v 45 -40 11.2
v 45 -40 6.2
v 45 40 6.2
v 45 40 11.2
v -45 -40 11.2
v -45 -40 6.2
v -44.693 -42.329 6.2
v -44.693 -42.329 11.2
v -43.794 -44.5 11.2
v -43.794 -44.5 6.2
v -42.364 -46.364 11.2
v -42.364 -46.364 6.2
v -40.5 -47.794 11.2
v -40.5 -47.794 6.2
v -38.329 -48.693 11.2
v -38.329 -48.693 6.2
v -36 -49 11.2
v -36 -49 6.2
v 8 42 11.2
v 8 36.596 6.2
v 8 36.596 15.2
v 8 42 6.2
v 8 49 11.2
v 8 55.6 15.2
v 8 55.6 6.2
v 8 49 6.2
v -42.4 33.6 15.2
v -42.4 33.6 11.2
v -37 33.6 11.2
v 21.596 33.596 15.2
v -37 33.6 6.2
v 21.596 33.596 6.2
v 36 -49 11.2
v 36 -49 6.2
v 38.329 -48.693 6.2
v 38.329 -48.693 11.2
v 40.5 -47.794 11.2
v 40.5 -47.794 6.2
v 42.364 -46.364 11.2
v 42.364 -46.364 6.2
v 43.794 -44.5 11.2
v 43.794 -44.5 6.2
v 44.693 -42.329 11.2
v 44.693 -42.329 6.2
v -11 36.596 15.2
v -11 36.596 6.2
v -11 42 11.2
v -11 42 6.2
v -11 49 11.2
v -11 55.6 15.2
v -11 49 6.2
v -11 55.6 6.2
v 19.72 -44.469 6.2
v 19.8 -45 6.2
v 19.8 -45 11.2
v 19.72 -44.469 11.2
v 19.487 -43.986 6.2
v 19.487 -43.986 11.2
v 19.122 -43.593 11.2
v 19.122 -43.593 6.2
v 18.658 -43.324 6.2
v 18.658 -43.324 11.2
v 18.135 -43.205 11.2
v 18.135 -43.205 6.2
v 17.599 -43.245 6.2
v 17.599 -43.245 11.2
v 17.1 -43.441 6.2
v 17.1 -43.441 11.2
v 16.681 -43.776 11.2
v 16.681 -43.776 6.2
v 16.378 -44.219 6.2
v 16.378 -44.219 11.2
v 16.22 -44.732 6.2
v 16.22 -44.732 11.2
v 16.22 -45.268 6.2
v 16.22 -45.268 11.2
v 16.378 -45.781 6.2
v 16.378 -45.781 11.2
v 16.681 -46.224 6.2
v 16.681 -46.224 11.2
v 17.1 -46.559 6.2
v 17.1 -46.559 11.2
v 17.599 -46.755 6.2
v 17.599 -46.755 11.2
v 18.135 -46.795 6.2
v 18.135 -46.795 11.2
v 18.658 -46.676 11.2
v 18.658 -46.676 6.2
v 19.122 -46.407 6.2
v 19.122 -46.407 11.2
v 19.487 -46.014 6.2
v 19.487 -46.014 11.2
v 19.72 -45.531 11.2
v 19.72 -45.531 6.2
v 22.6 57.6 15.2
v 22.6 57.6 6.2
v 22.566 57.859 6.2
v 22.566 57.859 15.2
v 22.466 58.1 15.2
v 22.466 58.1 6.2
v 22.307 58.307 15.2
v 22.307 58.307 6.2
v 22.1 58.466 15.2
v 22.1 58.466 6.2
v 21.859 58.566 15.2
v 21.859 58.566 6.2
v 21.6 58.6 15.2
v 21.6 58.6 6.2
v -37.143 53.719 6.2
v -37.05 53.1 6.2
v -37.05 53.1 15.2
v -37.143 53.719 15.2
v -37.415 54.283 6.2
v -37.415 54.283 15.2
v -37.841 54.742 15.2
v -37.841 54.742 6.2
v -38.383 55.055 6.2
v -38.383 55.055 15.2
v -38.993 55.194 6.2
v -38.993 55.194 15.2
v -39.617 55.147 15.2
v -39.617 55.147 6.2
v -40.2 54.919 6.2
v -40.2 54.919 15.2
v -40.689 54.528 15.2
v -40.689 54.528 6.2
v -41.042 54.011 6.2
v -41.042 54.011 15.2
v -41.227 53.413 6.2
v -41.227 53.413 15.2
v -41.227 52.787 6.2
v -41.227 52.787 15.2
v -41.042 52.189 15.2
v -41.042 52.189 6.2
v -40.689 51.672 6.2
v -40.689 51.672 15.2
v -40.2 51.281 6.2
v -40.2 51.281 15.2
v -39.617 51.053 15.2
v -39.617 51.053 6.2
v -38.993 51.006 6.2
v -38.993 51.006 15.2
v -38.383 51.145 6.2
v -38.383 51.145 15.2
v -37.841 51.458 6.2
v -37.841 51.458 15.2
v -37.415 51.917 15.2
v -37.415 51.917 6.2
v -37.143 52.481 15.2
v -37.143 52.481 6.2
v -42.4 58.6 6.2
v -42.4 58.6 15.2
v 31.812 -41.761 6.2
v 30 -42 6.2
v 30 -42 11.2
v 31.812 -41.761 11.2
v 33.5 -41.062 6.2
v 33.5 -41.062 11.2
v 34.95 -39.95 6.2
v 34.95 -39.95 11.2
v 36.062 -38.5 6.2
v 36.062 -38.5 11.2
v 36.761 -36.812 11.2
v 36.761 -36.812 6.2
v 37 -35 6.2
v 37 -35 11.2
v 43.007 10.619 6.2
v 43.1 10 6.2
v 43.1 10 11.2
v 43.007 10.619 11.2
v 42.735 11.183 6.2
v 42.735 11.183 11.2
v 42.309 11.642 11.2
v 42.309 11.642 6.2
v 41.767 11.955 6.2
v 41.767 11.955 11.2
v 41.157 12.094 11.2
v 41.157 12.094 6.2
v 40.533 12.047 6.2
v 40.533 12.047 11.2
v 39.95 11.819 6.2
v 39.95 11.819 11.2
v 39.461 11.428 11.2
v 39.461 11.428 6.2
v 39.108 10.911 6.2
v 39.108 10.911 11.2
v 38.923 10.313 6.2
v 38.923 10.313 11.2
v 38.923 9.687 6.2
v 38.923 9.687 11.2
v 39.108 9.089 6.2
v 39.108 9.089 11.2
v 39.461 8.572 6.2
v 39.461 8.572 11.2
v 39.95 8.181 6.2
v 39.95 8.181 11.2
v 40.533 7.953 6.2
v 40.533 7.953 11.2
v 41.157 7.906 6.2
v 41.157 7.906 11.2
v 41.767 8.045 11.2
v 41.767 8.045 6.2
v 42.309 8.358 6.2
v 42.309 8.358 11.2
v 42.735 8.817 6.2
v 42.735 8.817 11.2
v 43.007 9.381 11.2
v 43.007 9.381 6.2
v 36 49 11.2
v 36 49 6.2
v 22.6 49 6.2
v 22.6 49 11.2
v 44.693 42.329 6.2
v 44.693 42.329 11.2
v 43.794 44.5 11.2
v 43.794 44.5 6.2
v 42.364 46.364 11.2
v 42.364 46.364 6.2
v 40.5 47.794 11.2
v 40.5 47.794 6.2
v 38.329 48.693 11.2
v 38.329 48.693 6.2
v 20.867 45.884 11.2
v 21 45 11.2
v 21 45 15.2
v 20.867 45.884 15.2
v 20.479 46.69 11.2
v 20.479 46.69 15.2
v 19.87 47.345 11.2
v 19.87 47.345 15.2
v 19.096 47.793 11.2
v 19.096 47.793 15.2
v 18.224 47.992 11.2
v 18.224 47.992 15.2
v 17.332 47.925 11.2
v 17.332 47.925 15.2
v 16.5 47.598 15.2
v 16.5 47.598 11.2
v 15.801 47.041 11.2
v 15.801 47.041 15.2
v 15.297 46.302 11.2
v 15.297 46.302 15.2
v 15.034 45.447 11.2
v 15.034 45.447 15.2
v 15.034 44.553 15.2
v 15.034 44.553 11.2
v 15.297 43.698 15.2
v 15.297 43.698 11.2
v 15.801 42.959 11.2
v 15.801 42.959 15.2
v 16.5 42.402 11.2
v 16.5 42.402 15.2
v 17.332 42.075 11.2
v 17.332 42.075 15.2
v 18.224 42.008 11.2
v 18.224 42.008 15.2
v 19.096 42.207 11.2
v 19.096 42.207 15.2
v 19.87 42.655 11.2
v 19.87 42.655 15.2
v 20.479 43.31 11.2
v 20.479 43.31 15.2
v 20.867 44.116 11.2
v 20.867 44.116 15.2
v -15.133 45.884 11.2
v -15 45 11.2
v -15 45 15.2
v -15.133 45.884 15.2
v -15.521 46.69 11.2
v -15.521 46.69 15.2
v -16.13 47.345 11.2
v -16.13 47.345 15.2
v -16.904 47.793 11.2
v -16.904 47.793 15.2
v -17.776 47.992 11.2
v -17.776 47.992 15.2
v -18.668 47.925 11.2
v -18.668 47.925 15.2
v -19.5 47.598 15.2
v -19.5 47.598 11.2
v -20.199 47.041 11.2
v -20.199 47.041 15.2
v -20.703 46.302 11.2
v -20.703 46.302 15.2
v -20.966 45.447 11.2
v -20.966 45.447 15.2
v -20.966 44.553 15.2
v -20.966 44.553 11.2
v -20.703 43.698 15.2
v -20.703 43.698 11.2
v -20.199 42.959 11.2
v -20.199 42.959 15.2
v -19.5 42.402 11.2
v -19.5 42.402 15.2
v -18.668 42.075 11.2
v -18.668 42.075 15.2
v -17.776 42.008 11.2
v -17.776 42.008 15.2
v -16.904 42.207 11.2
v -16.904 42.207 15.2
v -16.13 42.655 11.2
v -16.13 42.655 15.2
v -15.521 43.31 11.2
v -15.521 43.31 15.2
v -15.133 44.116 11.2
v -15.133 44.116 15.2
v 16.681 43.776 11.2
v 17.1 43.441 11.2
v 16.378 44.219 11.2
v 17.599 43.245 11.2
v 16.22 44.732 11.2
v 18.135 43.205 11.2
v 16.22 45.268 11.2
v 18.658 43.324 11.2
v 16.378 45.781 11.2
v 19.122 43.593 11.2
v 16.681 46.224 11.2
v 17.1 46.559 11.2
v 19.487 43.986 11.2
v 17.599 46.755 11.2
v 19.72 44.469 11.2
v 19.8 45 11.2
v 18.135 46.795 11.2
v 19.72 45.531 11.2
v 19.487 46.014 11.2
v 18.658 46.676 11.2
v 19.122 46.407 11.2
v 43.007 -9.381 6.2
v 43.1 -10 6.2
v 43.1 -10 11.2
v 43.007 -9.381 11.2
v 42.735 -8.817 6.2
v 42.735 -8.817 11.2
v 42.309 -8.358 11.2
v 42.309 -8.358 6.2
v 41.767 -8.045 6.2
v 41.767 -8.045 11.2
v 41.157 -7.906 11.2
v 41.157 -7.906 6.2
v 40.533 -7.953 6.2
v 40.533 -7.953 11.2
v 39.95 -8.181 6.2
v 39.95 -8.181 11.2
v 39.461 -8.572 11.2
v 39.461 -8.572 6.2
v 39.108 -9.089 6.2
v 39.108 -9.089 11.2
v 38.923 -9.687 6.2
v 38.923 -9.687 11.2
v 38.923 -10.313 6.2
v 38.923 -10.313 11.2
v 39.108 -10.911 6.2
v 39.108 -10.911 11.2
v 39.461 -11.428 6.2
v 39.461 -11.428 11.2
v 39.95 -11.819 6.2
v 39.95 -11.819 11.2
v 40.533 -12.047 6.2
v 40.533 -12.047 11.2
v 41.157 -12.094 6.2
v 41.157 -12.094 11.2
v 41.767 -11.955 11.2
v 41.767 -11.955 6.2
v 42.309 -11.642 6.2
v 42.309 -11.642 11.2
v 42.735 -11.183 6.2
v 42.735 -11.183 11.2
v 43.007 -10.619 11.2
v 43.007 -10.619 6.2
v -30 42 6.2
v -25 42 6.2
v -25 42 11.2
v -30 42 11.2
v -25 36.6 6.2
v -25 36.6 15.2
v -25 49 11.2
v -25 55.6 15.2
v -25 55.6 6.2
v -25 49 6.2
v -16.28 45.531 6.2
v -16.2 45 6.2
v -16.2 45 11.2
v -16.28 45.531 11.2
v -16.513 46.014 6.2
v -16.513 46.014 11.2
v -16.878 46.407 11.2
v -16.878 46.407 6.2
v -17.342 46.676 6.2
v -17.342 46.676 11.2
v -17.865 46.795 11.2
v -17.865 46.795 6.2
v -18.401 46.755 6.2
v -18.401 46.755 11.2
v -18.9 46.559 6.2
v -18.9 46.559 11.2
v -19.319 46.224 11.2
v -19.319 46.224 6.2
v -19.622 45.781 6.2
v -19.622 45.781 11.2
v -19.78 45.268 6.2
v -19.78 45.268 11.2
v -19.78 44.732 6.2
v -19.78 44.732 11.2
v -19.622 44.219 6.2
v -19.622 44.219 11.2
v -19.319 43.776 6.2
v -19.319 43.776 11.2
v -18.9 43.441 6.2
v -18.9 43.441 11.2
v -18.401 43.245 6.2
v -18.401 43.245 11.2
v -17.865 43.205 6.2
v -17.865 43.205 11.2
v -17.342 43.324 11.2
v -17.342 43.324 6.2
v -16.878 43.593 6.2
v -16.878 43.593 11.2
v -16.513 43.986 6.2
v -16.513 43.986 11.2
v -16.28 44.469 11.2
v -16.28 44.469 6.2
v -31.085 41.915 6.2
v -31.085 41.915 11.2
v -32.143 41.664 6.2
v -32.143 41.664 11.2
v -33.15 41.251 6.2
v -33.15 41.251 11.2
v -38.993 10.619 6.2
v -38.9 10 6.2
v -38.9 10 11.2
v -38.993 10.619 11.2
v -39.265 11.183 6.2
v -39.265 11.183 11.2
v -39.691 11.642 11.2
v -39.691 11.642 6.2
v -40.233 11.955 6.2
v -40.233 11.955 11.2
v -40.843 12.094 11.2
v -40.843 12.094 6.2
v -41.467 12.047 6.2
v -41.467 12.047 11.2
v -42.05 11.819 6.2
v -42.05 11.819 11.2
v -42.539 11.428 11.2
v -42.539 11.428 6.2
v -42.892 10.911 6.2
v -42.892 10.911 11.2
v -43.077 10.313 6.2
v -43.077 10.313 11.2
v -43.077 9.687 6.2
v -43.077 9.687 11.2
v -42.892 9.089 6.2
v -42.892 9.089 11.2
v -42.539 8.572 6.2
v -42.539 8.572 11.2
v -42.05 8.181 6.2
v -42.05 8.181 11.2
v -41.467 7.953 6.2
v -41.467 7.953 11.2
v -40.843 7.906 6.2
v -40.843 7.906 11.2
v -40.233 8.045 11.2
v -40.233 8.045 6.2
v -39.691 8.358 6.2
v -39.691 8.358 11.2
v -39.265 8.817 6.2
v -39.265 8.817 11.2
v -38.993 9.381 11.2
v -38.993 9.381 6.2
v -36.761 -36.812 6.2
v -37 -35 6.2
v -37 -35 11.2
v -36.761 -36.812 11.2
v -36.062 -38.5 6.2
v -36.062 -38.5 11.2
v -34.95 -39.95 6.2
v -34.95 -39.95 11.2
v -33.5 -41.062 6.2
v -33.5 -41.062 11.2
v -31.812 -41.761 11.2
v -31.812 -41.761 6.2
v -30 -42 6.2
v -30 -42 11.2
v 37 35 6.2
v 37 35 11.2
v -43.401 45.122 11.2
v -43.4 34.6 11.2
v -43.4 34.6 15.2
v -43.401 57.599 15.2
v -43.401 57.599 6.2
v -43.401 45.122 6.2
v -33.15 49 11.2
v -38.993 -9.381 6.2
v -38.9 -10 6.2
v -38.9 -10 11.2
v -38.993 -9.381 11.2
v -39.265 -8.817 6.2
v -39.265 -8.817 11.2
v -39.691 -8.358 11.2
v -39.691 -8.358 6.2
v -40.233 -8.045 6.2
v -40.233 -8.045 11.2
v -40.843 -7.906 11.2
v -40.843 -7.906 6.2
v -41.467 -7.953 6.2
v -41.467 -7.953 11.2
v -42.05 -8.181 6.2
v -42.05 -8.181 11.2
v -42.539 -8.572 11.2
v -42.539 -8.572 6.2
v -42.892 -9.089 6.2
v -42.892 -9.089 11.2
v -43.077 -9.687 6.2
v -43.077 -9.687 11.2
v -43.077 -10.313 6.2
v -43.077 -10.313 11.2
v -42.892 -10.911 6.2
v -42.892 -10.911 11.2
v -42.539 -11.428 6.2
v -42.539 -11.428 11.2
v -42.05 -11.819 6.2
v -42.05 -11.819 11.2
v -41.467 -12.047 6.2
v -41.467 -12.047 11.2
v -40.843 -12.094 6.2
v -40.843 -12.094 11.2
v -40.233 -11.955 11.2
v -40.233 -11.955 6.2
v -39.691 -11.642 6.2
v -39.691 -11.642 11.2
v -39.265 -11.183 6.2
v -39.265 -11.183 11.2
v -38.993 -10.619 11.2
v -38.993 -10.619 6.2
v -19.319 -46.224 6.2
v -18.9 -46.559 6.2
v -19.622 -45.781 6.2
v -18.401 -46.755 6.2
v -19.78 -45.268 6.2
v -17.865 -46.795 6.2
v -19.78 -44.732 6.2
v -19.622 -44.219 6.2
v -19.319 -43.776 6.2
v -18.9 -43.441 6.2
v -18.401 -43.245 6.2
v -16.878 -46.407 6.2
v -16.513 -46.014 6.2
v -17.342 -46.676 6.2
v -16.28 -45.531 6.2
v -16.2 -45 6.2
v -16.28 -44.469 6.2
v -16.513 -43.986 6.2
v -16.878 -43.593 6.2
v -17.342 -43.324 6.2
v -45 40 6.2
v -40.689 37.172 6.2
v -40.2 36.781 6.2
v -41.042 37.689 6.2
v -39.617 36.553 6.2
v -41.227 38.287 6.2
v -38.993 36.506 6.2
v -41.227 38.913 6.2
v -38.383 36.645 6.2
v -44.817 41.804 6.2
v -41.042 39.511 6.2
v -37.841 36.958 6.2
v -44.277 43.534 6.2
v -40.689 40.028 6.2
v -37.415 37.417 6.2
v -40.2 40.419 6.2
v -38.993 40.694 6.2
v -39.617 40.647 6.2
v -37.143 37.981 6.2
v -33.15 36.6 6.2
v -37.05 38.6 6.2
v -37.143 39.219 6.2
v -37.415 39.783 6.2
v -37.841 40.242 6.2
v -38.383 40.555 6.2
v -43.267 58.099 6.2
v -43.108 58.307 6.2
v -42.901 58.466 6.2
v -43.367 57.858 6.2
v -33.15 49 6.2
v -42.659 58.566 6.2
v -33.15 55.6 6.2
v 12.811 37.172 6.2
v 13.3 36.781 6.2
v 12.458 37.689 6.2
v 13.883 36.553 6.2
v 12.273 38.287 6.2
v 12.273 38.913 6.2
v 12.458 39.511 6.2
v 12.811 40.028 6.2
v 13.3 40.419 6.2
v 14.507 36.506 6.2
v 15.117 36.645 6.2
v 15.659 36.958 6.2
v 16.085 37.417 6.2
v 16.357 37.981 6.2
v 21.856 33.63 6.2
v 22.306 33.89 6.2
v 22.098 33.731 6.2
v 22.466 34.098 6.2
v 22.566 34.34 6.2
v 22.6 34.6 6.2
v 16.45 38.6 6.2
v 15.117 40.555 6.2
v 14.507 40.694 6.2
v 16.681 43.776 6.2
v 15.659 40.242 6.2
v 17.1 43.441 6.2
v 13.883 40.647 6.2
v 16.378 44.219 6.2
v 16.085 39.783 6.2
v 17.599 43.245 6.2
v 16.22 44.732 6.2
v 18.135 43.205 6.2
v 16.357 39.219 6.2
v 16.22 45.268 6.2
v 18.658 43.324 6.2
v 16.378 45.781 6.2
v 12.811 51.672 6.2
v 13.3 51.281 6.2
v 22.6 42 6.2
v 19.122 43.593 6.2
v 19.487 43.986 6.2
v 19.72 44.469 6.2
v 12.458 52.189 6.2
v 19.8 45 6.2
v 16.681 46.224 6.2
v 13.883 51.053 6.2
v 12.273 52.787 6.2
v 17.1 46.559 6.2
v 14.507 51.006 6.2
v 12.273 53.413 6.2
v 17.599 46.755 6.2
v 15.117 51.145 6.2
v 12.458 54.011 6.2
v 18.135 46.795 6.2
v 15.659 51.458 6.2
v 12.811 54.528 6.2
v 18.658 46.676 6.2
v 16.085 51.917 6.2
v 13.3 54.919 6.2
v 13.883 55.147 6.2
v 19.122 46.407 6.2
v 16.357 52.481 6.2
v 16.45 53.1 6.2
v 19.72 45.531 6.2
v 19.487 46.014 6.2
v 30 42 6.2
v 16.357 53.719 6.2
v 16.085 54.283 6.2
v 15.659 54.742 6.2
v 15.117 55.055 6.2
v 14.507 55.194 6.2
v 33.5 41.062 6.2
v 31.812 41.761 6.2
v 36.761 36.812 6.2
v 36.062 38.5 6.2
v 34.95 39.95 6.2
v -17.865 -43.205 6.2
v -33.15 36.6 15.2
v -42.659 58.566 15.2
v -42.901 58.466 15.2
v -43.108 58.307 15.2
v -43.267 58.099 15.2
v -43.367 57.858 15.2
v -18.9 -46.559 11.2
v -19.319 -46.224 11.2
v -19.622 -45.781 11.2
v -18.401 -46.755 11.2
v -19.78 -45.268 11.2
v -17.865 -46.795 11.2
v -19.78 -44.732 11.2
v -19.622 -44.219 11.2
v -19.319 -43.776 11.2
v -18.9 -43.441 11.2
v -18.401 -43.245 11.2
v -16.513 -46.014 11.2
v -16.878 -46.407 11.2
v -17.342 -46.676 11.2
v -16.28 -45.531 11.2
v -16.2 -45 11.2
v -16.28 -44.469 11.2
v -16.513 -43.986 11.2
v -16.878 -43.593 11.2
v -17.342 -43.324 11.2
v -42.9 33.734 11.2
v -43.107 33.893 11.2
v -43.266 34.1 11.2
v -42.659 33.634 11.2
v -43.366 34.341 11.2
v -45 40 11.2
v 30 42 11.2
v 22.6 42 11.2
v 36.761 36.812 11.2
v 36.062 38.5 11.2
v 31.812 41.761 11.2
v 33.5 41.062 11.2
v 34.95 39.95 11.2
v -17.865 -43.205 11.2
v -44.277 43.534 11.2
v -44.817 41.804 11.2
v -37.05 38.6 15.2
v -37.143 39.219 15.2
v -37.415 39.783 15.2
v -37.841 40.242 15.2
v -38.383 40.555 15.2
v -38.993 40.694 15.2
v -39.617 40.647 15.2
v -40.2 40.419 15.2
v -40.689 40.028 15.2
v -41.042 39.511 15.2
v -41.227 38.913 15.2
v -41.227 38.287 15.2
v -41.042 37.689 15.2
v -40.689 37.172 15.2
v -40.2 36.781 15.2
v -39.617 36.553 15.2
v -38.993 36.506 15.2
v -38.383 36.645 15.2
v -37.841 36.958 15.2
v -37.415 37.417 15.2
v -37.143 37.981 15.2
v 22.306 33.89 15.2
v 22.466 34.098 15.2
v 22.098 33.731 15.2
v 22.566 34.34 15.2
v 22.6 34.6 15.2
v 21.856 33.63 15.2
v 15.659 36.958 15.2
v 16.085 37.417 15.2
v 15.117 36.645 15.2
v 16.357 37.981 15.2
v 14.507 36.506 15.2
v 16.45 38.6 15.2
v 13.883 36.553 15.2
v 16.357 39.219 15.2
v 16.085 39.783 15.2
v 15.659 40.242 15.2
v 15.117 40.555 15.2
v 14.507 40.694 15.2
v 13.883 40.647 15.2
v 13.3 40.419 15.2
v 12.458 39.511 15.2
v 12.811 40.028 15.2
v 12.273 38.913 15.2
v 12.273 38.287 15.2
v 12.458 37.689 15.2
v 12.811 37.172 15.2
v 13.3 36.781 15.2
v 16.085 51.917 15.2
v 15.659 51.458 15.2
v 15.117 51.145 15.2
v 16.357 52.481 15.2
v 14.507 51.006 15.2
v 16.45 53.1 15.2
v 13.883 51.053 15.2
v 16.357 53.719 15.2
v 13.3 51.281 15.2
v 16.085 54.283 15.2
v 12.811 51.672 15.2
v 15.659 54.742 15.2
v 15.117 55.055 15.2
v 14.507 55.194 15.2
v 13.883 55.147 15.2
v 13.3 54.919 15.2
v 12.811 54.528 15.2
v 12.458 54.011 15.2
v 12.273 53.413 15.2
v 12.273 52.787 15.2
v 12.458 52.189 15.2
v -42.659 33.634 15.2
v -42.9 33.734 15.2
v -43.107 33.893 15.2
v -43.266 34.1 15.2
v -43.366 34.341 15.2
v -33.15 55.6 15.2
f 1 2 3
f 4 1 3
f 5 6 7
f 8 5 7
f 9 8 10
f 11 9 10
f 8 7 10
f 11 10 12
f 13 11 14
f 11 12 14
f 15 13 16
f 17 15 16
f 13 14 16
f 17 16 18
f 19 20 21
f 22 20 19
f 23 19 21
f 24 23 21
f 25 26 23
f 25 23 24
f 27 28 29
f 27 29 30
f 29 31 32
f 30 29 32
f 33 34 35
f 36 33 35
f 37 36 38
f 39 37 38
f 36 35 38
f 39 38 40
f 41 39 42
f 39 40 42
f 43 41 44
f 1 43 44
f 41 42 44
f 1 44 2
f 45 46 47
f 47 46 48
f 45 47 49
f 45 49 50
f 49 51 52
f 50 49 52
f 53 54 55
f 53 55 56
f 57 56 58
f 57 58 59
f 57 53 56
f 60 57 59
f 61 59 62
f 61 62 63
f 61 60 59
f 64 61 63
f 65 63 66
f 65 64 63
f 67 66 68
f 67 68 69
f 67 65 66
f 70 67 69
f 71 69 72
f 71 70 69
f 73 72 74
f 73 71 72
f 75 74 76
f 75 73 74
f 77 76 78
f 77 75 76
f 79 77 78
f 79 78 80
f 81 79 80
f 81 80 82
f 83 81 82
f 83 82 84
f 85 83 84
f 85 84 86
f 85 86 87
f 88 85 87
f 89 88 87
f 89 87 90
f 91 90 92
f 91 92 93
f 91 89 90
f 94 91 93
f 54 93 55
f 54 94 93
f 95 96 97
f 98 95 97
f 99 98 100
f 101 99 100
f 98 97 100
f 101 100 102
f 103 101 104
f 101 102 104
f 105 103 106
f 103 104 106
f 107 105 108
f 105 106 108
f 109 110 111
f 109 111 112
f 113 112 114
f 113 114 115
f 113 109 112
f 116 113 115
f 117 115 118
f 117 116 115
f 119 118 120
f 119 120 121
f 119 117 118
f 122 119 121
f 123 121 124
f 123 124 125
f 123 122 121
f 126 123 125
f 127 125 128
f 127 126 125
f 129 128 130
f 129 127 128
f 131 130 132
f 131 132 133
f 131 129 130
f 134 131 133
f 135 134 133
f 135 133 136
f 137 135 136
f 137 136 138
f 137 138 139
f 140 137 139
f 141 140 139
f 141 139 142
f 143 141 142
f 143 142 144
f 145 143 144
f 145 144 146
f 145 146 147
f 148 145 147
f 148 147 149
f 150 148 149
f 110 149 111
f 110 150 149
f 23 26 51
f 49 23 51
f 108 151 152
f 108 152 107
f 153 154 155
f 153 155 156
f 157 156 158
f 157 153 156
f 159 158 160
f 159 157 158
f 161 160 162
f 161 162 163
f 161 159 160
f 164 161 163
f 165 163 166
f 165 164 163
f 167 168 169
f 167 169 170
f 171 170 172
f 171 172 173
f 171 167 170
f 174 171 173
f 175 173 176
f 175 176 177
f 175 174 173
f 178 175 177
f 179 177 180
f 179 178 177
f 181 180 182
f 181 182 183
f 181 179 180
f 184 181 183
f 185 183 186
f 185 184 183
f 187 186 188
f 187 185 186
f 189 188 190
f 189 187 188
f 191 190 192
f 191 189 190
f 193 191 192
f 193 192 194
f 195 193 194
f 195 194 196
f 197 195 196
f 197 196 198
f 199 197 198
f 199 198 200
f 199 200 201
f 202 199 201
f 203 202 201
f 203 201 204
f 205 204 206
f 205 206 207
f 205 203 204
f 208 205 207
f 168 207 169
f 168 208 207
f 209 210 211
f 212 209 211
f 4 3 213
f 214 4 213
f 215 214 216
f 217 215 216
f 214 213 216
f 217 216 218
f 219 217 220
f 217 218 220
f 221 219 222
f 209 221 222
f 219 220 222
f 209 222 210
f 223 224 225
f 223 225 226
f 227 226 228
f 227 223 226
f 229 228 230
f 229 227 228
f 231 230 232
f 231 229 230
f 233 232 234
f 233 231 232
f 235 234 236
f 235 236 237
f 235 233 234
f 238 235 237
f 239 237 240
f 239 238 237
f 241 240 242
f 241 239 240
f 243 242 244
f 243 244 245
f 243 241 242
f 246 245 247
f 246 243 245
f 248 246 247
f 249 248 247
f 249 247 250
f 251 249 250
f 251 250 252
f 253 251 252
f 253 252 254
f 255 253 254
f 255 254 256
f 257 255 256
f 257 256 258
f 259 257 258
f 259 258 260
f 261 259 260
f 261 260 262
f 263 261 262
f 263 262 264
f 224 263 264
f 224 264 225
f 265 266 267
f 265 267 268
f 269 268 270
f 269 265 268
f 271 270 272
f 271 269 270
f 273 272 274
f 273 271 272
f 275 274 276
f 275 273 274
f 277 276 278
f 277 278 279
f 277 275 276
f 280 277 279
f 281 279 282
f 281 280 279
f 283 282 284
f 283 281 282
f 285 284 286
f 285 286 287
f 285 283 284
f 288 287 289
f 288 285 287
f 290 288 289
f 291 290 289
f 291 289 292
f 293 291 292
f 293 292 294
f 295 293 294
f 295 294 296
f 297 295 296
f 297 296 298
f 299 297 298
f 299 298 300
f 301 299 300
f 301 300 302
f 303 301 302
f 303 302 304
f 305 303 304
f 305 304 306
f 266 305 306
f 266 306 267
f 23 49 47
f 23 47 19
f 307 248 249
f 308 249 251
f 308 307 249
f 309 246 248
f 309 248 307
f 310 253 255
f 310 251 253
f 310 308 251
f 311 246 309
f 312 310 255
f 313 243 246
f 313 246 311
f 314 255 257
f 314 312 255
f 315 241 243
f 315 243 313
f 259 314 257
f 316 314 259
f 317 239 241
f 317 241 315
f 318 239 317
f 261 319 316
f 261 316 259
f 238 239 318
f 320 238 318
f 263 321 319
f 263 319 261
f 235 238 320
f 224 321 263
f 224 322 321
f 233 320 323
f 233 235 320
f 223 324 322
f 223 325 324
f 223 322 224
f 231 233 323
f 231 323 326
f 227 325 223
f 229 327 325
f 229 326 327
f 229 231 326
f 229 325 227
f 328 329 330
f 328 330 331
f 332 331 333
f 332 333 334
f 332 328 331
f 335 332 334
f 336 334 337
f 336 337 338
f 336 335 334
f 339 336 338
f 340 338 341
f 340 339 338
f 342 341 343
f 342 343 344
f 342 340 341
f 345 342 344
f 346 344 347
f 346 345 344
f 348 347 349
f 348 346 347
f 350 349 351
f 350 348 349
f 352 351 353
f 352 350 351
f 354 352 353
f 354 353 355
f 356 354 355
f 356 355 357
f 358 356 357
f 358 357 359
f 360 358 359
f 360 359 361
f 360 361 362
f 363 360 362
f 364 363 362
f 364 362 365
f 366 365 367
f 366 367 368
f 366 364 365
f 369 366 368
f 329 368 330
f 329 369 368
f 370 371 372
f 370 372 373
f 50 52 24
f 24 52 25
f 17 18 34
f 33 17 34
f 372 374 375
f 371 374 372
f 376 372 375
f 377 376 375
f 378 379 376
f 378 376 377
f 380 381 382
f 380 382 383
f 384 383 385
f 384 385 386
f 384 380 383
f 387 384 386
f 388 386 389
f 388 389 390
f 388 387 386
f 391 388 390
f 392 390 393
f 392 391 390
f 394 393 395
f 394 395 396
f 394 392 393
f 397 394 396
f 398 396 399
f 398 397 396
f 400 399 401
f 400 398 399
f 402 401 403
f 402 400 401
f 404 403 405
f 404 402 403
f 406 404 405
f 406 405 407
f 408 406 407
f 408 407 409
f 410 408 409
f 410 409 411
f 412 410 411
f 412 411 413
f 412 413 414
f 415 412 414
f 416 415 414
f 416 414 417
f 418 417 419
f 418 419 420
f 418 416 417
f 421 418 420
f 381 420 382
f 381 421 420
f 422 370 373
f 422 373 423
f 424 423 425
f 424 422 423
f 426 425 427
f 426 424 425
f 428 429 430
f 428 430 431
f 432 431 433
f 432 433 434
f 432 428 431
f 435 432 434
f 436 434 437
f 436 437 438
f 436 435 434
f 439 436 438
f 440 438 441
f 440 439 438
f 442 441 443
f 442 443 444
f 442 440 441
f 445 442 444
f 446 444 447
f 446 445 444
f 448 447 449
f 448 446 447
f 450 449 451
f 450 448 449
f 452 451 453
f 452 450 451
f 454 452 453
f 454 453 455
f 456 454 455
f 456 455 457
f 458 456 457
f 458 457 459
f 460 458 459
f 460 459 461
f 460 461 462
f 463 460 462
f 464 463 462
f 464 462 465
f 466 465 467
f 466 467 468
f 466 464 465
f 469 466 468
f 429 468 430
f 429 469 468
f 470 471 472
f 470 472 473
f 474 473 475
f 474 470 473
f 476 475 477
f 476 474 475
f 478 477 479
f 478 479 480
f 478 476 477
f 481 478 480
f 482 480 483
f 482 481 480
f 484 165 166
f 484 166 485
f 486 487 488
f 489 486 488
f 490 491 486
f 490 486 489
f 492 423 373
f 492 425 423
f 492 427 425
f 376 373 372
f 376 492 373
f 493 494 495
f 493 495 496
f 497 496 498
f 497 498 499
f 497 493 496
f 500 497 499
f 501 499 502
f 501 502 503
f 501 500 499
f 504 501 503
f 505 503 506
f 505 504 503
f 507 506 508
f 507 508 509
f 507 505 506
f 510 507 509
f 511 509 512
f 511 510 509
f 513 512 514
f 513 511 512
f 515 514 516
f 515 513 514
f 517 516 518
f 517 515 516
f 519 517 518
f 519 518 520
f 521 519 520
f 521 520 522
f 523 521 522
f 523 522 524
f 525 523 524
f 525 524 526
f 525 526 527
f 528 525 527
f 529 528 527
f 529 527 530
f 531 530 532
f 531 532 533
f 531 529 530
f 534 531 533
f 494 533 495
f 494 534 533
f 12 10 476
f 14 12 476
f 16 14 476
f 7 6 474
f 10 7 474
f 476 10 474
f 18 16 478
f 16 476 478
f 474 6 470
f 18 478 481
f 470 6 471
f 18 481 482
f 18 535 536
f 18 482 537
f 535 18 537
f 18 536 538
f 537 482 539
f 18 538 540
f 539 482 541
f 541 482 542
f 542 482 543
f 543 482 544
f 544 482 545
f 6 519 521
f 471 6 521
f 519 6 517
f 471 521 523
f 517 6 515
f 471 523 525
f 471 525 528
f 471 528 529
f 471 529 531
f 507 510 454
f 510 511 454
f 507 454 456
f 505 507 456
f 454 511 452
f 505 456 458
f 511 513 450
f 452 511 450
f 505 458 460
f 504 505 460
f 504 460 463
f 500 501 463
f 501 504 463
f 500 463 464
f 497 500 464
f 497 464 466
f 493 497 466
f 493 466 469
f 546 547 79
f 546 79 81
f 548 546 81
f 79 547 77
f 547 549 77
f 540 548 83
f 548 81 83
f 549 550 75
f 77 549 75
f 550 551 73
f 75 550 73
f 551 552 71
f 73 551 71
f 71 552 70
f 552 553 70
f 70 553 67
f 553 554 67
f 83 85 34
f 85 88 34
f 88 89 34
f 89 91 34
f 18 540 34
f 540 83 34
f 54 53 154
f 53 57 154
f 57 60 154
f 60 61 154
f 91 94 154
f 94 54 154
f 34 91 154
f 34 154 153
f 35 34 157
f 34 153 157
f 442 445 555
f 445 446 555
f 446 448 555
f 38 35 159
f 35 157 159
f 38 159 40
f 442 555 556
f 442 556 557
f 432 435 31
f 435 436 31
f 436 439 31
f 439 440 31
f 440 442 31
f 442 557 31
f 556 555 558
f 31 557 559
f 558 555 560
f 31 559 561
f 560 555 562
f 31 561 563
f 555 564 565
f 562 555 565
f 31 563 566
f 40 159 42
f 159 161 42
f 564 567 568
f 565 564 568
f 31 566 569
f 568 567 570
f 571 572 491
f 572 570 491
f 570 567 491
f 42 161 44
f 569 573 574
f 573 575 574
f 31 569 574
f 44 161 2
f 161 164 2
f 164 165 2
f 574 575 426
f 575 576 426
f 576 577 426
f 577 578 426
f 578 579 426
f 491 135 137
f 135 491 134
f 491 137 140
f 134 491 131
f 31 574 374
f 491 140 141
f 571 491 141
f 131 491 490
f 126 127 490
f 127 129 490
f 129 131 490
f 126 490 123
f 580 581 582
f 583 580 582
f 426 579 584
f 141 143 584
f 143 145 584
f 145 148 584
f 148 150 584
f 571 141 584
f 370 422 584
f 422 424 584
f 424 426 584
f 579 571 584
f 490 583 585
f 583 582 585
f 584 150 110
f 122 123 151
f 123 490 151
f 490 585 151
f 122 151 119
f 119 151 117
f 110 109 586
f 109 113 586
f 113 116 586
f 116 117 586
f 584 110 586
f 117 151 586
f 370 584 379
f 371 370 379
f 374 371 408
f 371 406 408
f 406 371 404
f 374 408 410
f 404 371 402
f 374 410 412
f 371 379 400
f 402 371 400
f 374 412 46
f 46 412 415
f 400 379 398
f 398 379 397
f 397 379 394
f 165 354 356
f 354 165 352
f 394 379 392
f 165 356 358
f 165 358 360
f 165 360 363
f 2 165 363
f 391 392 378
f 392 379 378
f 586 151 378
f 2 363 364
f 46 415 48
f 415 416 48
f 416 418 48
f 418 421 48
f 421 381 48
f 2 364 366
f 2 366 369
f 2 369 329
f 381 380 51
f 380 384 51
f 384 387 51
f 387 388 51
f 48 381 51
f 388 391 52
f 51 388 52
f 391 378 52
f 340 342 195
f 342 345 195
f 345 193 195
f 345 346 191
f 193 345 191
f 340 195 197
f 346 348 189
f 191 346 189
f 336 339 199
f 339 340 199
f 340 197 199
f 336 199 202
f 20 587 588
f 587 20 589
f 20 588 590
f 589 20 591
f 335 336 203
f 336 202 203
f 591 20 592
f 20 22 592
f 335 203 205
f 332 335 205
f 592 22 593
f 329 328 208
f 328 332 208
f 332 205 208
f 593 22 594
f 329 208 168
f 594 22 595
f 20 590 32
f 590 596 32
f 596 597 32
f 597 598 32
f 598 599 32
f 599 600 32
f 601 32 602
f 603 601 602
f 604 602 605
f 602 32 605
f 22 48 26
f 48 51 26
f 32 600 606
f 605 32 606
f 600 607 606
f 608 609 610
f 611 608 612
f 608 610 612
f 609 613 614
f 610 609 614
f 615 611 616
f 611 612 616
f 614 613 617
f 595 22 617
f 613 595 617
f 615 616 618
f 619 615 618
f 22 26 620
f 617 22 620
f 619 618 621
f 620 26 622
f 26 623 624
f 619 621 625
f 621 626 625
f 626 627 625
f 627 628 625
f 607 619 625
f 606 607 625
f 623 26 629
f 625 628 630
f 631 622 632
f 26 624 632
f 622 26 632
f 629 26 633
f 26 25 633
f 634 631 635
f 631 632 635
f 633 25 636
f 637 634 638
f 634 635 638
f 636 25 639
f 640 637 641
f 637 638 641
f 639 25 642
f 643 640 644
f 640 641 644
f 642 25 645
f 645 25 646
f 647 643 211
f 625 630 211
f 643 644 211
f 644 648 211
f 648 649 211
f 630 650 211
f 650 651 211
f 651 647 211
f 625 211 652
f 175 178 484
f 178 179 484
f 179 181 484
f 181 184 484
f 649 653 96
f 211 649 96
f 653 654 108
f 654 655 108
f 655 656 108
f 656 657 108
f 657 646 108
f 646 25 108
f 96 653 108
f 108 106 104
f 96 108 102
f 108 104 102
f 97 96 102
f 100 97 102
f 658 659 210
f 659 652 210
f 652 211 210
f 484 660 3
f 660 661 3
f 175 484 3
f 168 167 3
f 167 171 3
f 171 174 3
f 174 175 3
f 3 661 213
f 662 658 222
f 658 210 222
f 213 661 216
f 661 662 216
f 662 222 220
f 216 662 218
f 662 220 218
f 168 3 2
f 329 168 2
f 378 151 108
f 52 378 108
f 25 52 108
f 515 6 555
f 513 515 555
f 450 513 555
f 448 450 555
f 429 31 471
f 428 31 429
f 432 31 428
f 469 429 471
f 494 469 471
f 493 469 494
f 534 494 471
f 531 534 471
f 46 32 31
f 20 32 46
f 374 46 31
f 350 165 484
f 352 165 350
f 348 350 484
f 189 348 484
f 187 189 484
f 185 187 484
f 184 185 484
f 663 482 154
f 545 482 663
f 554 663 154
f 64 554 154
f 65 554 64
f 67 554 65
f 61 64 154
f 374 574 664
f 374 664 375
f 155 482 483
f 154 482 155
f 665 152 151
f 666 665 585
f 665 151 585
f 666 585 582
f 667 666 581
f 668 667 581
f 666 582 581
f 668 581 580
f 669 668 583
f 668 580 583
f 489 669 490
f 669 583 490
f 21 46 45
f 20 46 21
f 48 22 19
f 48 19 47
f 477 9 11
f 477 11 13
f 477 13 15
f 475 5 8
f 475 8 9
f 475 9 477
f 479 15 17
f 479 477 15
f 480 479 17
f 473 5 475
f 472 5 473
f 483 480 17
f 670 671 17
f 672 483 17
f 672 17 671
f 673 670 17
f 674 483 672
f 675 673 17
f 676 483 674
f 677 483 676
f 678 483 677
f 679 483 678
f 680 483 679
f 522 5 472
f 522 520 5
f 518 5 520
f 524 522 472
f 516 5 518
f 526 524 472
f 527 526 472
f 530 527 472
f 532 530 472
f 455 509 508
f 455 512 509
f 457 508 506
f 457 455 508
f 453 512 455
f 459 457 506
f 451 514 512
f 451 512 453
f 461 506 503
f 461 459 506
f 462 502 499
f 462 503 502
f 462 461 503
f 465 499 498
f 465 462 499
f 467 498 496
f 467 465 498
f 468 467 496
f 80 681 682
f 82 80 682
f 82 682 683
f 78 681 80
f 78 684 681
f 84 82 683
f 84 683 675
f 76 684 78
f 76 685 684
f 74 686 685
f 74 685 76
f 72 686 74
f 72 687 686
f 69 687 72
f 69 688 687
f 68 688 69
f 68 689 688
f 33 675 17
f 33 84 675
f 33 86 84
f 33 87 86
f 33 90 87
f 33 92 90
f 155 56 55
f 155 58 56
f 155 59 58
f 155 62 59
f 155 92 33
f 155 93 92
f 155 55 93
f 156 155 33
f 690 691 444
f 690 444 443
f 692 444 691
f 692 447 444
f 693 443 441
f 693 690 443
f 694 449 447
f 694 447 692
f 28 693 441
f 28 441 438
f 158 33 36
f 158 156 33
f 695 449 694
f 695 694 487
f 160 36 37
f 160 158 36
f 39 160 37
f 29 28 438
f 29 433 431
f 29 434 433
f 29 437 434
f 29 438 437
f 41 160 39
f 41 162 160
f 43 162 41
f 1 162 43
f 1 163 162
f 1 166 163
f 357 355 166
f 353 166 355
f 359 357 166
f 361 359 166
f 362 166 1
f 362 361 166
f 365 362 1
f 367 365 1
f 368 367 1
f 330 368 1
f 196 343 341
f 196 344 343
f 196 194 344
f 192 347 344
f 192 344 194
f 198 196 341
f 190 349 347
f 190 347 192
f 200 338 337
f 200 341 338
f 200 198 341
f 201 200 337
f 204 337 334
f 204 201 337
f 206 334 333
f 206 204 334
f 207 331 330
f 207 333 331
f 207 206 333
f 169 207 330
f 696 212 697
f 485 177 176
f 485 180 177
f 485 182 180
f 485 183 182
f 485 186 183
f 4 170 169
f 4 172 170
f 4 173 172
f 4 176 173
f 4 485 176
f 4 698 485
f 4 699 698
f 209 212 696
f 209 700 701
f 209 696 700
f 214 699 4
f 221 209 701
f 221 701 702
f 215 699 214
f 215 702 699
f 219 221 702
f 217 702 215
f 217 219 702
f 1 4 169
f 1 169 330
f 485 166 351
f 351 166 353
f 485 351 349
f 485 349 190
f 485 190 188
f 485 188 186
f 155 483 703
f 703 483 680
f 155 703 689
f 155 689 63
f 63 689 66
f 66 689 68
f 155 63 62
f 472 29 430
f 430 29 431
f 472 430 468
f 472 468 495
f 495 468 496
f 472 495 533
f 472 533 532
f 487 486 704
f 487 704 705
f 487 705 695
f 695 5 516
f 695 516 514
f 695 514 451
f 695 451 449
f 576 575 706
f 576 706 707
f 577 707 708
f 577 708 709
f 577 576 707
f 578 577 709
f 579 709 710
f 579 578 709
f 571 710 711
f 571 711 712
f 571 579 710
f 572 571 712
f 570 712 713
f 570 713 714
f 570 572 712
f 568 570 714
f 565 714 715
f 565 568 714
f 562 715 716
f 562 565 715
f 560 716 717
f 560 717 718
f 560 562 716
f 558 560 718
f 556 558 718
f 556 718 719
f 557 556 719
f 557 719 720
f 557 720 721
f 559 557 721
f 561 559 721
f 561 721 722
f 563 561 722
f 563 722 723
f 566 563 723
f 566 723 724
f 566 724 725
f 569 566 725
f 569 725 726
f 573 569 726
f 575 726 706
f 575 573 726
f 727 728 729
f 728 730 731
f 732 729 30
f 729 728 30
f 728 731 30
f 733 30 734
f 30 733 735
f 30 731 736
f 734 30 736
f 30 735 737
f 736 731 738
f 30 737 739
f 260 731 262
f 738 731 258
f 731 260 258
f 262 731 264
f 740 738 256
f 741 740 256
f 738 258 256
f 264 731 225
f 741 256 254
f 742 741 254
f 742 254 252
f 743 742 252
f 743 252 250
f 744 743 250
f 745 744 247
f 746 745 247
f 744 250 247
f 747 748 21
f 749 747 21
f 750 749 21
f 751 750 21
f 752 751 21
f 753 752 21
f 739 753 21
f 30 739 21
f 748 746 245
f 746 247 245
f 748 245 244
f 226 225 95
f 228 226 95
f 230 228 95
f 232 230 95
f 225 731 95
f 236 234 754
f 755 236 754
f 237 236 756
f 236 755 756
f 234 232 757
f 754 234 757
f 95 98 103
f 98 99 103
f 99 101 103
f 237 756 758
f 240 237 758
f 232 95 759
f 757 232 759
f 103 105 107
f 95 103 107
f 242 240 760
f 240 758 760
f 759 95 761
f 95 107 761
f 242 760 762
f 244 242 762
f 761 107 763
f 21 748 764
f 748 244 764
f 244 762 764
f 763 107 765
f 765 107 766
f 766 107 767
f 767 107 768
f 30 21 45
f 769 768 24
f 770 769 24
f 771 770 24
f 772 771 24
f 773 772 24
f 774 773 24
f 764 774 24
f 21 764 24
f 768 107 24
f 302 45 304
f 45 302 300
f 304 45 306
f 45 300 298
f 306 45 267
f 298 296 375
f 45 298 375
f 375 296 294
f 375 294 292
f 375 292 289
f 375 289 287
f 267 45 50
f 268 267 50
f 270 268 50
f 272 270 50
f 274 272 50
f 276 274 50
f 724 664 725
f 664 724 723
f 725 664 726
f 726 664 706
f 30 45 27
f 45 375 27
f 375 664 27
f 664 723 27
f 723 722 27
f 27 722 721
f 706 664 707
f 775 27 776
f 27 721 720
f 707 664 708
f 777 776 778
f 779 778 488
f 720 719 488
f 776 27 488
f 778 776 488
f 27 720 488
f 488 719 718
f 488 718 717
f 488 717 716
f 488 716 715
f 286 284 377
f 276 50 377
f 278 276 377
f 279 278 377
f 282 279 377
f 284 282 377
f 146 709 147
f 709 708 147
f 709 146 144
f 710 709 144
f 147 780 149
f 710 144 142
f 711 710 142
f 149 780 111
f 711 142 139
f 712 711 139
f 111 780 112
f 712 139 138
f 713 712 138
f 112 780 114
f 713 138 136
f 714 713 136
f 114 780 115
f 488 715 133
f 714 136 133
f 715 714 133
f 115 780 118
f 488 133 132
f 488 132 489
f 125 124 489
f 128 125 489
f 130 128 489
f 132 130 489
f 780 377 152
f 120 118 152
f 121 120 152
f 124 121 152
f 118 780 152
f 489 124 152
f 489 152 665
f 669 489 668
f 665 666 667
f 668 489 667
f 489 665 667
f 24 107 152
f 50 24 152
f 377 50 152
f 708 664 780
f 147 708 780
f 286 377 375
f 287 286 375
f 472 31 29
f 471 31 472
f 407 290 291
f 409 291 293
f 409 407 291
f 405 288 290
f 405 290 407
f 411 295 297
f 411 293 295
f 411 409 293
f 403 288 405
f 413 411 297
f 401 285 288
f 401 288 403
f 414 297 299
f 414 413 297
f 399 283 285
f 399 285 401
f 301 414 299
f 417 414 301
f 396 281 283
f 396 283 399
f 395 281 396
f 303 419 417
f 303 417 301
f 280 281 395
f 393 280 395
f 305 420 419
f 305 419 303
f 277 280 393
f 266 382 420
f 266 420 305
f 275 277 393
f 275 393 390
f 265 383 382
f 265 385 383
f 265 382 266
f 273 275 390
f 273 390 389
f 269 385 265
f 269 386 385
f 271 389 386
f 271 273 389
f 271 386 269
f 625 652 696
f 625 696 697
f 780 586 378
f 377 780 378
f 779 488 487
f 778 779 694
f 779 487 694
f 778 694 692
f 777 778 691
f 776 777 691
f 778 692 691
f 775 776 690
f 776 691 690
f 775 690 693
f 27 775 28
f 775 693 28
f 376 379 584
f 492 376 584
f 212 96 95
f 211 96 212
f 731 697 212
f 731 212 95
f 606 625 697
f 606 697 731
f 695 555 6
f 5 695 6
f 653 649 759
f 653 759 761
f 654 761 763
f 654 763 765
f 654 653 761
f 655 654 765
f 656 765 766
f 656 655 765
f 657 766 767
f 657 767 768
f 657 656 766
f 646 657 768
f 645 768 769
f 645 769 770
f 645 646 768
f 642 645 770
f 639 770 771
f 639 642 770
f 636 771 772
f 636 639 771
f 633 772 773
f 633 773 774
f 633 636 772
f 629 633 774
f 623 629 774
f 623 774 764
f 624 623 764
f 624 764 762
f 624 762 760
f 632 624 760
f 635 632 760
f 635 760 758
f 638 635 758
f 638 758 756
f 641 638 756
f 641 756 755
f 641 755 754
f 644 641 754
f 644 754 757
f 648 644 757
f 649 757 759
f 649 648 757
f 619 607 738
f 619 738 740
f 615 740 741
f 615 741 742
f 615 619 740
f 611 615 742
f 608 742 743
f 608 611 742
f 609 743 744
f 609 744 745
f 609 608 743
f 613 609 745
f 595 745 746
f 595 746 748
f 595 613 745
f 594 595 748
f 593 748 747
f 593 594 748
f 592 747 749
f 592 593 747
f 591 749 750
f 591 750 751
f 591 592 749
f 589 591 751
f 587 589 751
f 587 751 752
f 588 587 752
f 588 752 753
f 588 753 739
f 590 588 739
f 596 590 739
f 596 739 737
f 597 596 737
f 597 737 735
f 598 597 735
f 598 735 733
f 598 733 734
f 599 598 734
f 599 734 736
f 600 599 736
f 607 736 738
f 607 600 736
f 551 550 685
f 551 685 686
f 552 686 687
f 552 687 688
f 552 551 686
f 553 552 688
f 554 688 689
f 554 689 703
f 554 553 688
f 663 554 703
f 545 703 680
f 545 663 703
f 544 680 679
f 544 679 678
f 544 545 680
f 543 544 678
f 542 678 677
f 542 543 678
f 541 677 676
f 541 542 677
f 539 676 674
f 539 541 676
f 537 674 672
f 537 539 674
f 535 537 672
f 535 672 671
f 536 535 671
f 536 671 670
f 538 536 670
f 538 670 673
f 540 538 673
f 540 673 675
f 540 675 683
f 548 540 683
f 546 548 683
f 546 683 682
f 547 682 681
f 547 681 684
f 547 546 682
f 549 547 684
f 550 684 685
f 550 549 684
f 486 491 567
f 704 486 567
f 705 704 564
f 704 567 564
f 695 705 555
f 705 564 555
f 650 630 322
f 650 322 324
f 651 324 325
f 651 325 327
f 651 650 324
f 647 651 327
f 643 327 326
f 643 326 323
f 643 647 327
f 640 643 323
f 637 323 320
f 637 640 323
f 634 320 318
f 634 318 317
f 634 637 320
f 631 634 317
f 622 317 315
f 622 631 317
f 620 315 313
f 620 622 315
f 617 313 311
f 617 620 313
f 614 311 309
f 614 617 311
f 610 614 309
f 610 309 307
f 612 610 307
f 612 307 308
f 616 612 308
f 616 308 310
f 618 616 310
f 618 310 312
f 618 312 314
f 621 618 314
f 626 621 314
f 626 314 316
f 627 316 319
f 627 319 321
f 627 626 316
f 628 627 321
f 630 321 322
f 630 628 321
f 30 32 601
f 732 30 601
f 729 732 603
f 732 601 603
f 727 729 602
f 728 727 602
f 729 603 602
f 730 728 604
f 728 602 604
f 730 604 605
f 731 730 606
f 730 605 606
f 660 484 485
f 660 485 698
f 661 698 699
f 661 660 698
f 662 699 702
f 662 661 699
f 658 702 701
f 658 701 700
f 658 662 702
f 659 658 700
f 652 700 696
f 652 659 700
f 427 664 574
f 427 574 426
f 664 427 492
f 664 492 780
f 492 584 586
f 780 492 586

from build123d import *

# Parameters (mm, degrees)
SKETCH002_R      = 1.8
SKETCH002_R_2    = 2.1
SKETCH002_R_3    = 2.458824
EXTRUDE001_DEPTH = 5
SKETCH006_R      = 2.1
SKETCH006_R_2    = 3
SKETCH006_W      = 19
SKETCH006_H      = 19.003748
SKETCH006_W_2    = 8.15
SKETCH006_H_2    = 19
EXTRUDE005_DEPTH = 9


with BuildPart() as pair_connector_extrude:
    # Sketch002 → Extrude001 (new body)
    with BuildSketch(Plane.XY):
        with BuildLine():
            Line((-36, -49), (0, -49))
            Line((0, -49), (36, -49))
            ThreePointArc((36, -49), (42.363961, -46.363961), (45, -40))
            Line((45, -40), (45, 0))
            Line((45, 0), (45, 40))
            ThreePointArc((45, 40), (42.363961, 46.363961), (36, 49))
            Line((36, 49), (0, 49))
            Line((0, 49), (-36, 49))
            ThreePointArc((-36, 49), (-42.363961, 46.363961), (-45, 40))
            Line((-45, 40), (-45, 0))
            Line((-45, 0), (-45, -40))
            ThreePointArc((-45, -40), (-42.363961, -46.363961), (-36, -49))
        make_face()
        with Locations((-18, 45)):
            Circle(SKETCH002_R, mode=Mode.SUBTRACT)
        with Locations((18, 45)):
            Circle(SKETCH002_R, mode=Mode.SUBTRACT)
        with Locations((-18, -45)):
            Circle(SKETCH002_R, mode=Mode.SUBTRACT)
        with Locations((18, -45)):
            Circle(SKETCH002_R, mode=Mode.SUBTRACT)
        with Locations((-41, 10)):
            Circle(SKETCH002_R_2, mode=Mode.SUBTRACT)
        with Locations((-41, -10)):
            Circle(SKETCH002_R_2, mode=Mode.SUBTRACT)
        with Locations((-39.177948, 38.628017)):
            Circle(SKETCH002_R_3, mode=Mode.SUBTRACT)
        with Locations((41, -10)):
            Circle(SKETCH002_R_2, mode=Mode.SUBTRACT)
        with Locations((41, 10)):
            Circle(SKETCH002_R_2, mode=Mode.SUBTRACT)
        with BuildLine():
            Line((-30, -42), (0, -42))
            Line((0, -42), (30, -42))
            ThreePointArc((30, -42), (34.949747, -39.949747), (37, -35))
            Line((37, -35), (37, 0))
            Line((37, 0), (37, 35))
            ThreePointArc((37, 35), (34.949747, 39.949747), (30, 42))
            Line((30, 42), (0, 42))
            Line((0, 42), (-30, 42))
            ThreePointArc((-30, 42), (-34.949747, 39.949747), (-37, 35))
            Line((-37, 35), (-37, 0))
            Line((-37, 0), (-37, -35))
            ThreePointArc((-37, -35), (-34.949747, -39.949747), (-30, -42))
        make_face(mode=Mode.SUBTRACT)
    extrude(amount=EXTRUDE001_DEPTH)


with BuildPart() as pair_connector_extrude_1:
    # Extrude001 placement: moved
    add(pair_connector_extrude.part.moved(Location((0, 0, 6.2))))


with BuildPart() as pair_connector_fusion:
    # Sketch006 → Extrude005 (new body)
    with BuildSketch(Plane.XY):
        with BuildLine():
            Line((-42.4, 58.6), (21.6, 58.6))
            ThreePointArc((22.6, 57.6), (22.307107, 58.307107), (21.6, 58.6))
            Line((22.6, 57.6), (22.6, 34.6))
            ThreePointArc((21.596193, 33.596252), (22.305988, 33.890222), (22.6, 34.6))
            Line((-42.4, 33.6), (21.596193, 33.596252))
            ThreePointArc((-43.4, 34.6), (-43.10709, 33.89291), (-42.4, 33.6))
            Line((-43.4, 34.6), (-43.401347, 57.598594))
            ThreePointArc((-42.4, 58.6), (-43.10808, 58.306691), (-43.401347, 57.598594))
        make_face()
        with Locations((-39.15, 53.1)):
            Circle(SKETCH006_R, mode=Mode.SUBTRACT)
        with Locations((14.35, 53.1)):
            Circle(SKETCH006_R, mode=Mode.SUBTRACT)
        with Locations((-39.15, 38.6)):
            Circle(SKETCH006_R, mode=Mode.SUBTRACT)
        with Locations((14.35, 38.6)):
            Circle(SKETCH006_R, mode=Mode.SUBTRACT)
        with Locations((18, 45)):
            Circle(SKETCH006_R_2, mode=Mode.SUBTRACT)
        with Locations((-18, 45)):
            Circle(SKETCH006_R_2, mode=Mode.SUBTRACT)
        with Locations((-1.5, 46.098126)):
            Rectangle(SKETCH006_W, SKETCH006_H, mode=Mode.SUBTRACT)
        with Locations((-29.075, 46.1)):
            Rectangle(SKETCH006_W_2, SKETCH006_H_2, mode=Mode.SUBTRACT)
    extrude(amount=EXTRUDE005_DEPTH)


with BuildPart() as pair_connector_fusion_1:
    # Extrude005 placement: moved
    add(pair_connector_fusion.part.moved(Location((0, 0, 6.2))))

    # Fusion008: union pair connector extrude
    add(pair_connector_extrude_1.part)


solid = pair_connector_fusion_1.part
